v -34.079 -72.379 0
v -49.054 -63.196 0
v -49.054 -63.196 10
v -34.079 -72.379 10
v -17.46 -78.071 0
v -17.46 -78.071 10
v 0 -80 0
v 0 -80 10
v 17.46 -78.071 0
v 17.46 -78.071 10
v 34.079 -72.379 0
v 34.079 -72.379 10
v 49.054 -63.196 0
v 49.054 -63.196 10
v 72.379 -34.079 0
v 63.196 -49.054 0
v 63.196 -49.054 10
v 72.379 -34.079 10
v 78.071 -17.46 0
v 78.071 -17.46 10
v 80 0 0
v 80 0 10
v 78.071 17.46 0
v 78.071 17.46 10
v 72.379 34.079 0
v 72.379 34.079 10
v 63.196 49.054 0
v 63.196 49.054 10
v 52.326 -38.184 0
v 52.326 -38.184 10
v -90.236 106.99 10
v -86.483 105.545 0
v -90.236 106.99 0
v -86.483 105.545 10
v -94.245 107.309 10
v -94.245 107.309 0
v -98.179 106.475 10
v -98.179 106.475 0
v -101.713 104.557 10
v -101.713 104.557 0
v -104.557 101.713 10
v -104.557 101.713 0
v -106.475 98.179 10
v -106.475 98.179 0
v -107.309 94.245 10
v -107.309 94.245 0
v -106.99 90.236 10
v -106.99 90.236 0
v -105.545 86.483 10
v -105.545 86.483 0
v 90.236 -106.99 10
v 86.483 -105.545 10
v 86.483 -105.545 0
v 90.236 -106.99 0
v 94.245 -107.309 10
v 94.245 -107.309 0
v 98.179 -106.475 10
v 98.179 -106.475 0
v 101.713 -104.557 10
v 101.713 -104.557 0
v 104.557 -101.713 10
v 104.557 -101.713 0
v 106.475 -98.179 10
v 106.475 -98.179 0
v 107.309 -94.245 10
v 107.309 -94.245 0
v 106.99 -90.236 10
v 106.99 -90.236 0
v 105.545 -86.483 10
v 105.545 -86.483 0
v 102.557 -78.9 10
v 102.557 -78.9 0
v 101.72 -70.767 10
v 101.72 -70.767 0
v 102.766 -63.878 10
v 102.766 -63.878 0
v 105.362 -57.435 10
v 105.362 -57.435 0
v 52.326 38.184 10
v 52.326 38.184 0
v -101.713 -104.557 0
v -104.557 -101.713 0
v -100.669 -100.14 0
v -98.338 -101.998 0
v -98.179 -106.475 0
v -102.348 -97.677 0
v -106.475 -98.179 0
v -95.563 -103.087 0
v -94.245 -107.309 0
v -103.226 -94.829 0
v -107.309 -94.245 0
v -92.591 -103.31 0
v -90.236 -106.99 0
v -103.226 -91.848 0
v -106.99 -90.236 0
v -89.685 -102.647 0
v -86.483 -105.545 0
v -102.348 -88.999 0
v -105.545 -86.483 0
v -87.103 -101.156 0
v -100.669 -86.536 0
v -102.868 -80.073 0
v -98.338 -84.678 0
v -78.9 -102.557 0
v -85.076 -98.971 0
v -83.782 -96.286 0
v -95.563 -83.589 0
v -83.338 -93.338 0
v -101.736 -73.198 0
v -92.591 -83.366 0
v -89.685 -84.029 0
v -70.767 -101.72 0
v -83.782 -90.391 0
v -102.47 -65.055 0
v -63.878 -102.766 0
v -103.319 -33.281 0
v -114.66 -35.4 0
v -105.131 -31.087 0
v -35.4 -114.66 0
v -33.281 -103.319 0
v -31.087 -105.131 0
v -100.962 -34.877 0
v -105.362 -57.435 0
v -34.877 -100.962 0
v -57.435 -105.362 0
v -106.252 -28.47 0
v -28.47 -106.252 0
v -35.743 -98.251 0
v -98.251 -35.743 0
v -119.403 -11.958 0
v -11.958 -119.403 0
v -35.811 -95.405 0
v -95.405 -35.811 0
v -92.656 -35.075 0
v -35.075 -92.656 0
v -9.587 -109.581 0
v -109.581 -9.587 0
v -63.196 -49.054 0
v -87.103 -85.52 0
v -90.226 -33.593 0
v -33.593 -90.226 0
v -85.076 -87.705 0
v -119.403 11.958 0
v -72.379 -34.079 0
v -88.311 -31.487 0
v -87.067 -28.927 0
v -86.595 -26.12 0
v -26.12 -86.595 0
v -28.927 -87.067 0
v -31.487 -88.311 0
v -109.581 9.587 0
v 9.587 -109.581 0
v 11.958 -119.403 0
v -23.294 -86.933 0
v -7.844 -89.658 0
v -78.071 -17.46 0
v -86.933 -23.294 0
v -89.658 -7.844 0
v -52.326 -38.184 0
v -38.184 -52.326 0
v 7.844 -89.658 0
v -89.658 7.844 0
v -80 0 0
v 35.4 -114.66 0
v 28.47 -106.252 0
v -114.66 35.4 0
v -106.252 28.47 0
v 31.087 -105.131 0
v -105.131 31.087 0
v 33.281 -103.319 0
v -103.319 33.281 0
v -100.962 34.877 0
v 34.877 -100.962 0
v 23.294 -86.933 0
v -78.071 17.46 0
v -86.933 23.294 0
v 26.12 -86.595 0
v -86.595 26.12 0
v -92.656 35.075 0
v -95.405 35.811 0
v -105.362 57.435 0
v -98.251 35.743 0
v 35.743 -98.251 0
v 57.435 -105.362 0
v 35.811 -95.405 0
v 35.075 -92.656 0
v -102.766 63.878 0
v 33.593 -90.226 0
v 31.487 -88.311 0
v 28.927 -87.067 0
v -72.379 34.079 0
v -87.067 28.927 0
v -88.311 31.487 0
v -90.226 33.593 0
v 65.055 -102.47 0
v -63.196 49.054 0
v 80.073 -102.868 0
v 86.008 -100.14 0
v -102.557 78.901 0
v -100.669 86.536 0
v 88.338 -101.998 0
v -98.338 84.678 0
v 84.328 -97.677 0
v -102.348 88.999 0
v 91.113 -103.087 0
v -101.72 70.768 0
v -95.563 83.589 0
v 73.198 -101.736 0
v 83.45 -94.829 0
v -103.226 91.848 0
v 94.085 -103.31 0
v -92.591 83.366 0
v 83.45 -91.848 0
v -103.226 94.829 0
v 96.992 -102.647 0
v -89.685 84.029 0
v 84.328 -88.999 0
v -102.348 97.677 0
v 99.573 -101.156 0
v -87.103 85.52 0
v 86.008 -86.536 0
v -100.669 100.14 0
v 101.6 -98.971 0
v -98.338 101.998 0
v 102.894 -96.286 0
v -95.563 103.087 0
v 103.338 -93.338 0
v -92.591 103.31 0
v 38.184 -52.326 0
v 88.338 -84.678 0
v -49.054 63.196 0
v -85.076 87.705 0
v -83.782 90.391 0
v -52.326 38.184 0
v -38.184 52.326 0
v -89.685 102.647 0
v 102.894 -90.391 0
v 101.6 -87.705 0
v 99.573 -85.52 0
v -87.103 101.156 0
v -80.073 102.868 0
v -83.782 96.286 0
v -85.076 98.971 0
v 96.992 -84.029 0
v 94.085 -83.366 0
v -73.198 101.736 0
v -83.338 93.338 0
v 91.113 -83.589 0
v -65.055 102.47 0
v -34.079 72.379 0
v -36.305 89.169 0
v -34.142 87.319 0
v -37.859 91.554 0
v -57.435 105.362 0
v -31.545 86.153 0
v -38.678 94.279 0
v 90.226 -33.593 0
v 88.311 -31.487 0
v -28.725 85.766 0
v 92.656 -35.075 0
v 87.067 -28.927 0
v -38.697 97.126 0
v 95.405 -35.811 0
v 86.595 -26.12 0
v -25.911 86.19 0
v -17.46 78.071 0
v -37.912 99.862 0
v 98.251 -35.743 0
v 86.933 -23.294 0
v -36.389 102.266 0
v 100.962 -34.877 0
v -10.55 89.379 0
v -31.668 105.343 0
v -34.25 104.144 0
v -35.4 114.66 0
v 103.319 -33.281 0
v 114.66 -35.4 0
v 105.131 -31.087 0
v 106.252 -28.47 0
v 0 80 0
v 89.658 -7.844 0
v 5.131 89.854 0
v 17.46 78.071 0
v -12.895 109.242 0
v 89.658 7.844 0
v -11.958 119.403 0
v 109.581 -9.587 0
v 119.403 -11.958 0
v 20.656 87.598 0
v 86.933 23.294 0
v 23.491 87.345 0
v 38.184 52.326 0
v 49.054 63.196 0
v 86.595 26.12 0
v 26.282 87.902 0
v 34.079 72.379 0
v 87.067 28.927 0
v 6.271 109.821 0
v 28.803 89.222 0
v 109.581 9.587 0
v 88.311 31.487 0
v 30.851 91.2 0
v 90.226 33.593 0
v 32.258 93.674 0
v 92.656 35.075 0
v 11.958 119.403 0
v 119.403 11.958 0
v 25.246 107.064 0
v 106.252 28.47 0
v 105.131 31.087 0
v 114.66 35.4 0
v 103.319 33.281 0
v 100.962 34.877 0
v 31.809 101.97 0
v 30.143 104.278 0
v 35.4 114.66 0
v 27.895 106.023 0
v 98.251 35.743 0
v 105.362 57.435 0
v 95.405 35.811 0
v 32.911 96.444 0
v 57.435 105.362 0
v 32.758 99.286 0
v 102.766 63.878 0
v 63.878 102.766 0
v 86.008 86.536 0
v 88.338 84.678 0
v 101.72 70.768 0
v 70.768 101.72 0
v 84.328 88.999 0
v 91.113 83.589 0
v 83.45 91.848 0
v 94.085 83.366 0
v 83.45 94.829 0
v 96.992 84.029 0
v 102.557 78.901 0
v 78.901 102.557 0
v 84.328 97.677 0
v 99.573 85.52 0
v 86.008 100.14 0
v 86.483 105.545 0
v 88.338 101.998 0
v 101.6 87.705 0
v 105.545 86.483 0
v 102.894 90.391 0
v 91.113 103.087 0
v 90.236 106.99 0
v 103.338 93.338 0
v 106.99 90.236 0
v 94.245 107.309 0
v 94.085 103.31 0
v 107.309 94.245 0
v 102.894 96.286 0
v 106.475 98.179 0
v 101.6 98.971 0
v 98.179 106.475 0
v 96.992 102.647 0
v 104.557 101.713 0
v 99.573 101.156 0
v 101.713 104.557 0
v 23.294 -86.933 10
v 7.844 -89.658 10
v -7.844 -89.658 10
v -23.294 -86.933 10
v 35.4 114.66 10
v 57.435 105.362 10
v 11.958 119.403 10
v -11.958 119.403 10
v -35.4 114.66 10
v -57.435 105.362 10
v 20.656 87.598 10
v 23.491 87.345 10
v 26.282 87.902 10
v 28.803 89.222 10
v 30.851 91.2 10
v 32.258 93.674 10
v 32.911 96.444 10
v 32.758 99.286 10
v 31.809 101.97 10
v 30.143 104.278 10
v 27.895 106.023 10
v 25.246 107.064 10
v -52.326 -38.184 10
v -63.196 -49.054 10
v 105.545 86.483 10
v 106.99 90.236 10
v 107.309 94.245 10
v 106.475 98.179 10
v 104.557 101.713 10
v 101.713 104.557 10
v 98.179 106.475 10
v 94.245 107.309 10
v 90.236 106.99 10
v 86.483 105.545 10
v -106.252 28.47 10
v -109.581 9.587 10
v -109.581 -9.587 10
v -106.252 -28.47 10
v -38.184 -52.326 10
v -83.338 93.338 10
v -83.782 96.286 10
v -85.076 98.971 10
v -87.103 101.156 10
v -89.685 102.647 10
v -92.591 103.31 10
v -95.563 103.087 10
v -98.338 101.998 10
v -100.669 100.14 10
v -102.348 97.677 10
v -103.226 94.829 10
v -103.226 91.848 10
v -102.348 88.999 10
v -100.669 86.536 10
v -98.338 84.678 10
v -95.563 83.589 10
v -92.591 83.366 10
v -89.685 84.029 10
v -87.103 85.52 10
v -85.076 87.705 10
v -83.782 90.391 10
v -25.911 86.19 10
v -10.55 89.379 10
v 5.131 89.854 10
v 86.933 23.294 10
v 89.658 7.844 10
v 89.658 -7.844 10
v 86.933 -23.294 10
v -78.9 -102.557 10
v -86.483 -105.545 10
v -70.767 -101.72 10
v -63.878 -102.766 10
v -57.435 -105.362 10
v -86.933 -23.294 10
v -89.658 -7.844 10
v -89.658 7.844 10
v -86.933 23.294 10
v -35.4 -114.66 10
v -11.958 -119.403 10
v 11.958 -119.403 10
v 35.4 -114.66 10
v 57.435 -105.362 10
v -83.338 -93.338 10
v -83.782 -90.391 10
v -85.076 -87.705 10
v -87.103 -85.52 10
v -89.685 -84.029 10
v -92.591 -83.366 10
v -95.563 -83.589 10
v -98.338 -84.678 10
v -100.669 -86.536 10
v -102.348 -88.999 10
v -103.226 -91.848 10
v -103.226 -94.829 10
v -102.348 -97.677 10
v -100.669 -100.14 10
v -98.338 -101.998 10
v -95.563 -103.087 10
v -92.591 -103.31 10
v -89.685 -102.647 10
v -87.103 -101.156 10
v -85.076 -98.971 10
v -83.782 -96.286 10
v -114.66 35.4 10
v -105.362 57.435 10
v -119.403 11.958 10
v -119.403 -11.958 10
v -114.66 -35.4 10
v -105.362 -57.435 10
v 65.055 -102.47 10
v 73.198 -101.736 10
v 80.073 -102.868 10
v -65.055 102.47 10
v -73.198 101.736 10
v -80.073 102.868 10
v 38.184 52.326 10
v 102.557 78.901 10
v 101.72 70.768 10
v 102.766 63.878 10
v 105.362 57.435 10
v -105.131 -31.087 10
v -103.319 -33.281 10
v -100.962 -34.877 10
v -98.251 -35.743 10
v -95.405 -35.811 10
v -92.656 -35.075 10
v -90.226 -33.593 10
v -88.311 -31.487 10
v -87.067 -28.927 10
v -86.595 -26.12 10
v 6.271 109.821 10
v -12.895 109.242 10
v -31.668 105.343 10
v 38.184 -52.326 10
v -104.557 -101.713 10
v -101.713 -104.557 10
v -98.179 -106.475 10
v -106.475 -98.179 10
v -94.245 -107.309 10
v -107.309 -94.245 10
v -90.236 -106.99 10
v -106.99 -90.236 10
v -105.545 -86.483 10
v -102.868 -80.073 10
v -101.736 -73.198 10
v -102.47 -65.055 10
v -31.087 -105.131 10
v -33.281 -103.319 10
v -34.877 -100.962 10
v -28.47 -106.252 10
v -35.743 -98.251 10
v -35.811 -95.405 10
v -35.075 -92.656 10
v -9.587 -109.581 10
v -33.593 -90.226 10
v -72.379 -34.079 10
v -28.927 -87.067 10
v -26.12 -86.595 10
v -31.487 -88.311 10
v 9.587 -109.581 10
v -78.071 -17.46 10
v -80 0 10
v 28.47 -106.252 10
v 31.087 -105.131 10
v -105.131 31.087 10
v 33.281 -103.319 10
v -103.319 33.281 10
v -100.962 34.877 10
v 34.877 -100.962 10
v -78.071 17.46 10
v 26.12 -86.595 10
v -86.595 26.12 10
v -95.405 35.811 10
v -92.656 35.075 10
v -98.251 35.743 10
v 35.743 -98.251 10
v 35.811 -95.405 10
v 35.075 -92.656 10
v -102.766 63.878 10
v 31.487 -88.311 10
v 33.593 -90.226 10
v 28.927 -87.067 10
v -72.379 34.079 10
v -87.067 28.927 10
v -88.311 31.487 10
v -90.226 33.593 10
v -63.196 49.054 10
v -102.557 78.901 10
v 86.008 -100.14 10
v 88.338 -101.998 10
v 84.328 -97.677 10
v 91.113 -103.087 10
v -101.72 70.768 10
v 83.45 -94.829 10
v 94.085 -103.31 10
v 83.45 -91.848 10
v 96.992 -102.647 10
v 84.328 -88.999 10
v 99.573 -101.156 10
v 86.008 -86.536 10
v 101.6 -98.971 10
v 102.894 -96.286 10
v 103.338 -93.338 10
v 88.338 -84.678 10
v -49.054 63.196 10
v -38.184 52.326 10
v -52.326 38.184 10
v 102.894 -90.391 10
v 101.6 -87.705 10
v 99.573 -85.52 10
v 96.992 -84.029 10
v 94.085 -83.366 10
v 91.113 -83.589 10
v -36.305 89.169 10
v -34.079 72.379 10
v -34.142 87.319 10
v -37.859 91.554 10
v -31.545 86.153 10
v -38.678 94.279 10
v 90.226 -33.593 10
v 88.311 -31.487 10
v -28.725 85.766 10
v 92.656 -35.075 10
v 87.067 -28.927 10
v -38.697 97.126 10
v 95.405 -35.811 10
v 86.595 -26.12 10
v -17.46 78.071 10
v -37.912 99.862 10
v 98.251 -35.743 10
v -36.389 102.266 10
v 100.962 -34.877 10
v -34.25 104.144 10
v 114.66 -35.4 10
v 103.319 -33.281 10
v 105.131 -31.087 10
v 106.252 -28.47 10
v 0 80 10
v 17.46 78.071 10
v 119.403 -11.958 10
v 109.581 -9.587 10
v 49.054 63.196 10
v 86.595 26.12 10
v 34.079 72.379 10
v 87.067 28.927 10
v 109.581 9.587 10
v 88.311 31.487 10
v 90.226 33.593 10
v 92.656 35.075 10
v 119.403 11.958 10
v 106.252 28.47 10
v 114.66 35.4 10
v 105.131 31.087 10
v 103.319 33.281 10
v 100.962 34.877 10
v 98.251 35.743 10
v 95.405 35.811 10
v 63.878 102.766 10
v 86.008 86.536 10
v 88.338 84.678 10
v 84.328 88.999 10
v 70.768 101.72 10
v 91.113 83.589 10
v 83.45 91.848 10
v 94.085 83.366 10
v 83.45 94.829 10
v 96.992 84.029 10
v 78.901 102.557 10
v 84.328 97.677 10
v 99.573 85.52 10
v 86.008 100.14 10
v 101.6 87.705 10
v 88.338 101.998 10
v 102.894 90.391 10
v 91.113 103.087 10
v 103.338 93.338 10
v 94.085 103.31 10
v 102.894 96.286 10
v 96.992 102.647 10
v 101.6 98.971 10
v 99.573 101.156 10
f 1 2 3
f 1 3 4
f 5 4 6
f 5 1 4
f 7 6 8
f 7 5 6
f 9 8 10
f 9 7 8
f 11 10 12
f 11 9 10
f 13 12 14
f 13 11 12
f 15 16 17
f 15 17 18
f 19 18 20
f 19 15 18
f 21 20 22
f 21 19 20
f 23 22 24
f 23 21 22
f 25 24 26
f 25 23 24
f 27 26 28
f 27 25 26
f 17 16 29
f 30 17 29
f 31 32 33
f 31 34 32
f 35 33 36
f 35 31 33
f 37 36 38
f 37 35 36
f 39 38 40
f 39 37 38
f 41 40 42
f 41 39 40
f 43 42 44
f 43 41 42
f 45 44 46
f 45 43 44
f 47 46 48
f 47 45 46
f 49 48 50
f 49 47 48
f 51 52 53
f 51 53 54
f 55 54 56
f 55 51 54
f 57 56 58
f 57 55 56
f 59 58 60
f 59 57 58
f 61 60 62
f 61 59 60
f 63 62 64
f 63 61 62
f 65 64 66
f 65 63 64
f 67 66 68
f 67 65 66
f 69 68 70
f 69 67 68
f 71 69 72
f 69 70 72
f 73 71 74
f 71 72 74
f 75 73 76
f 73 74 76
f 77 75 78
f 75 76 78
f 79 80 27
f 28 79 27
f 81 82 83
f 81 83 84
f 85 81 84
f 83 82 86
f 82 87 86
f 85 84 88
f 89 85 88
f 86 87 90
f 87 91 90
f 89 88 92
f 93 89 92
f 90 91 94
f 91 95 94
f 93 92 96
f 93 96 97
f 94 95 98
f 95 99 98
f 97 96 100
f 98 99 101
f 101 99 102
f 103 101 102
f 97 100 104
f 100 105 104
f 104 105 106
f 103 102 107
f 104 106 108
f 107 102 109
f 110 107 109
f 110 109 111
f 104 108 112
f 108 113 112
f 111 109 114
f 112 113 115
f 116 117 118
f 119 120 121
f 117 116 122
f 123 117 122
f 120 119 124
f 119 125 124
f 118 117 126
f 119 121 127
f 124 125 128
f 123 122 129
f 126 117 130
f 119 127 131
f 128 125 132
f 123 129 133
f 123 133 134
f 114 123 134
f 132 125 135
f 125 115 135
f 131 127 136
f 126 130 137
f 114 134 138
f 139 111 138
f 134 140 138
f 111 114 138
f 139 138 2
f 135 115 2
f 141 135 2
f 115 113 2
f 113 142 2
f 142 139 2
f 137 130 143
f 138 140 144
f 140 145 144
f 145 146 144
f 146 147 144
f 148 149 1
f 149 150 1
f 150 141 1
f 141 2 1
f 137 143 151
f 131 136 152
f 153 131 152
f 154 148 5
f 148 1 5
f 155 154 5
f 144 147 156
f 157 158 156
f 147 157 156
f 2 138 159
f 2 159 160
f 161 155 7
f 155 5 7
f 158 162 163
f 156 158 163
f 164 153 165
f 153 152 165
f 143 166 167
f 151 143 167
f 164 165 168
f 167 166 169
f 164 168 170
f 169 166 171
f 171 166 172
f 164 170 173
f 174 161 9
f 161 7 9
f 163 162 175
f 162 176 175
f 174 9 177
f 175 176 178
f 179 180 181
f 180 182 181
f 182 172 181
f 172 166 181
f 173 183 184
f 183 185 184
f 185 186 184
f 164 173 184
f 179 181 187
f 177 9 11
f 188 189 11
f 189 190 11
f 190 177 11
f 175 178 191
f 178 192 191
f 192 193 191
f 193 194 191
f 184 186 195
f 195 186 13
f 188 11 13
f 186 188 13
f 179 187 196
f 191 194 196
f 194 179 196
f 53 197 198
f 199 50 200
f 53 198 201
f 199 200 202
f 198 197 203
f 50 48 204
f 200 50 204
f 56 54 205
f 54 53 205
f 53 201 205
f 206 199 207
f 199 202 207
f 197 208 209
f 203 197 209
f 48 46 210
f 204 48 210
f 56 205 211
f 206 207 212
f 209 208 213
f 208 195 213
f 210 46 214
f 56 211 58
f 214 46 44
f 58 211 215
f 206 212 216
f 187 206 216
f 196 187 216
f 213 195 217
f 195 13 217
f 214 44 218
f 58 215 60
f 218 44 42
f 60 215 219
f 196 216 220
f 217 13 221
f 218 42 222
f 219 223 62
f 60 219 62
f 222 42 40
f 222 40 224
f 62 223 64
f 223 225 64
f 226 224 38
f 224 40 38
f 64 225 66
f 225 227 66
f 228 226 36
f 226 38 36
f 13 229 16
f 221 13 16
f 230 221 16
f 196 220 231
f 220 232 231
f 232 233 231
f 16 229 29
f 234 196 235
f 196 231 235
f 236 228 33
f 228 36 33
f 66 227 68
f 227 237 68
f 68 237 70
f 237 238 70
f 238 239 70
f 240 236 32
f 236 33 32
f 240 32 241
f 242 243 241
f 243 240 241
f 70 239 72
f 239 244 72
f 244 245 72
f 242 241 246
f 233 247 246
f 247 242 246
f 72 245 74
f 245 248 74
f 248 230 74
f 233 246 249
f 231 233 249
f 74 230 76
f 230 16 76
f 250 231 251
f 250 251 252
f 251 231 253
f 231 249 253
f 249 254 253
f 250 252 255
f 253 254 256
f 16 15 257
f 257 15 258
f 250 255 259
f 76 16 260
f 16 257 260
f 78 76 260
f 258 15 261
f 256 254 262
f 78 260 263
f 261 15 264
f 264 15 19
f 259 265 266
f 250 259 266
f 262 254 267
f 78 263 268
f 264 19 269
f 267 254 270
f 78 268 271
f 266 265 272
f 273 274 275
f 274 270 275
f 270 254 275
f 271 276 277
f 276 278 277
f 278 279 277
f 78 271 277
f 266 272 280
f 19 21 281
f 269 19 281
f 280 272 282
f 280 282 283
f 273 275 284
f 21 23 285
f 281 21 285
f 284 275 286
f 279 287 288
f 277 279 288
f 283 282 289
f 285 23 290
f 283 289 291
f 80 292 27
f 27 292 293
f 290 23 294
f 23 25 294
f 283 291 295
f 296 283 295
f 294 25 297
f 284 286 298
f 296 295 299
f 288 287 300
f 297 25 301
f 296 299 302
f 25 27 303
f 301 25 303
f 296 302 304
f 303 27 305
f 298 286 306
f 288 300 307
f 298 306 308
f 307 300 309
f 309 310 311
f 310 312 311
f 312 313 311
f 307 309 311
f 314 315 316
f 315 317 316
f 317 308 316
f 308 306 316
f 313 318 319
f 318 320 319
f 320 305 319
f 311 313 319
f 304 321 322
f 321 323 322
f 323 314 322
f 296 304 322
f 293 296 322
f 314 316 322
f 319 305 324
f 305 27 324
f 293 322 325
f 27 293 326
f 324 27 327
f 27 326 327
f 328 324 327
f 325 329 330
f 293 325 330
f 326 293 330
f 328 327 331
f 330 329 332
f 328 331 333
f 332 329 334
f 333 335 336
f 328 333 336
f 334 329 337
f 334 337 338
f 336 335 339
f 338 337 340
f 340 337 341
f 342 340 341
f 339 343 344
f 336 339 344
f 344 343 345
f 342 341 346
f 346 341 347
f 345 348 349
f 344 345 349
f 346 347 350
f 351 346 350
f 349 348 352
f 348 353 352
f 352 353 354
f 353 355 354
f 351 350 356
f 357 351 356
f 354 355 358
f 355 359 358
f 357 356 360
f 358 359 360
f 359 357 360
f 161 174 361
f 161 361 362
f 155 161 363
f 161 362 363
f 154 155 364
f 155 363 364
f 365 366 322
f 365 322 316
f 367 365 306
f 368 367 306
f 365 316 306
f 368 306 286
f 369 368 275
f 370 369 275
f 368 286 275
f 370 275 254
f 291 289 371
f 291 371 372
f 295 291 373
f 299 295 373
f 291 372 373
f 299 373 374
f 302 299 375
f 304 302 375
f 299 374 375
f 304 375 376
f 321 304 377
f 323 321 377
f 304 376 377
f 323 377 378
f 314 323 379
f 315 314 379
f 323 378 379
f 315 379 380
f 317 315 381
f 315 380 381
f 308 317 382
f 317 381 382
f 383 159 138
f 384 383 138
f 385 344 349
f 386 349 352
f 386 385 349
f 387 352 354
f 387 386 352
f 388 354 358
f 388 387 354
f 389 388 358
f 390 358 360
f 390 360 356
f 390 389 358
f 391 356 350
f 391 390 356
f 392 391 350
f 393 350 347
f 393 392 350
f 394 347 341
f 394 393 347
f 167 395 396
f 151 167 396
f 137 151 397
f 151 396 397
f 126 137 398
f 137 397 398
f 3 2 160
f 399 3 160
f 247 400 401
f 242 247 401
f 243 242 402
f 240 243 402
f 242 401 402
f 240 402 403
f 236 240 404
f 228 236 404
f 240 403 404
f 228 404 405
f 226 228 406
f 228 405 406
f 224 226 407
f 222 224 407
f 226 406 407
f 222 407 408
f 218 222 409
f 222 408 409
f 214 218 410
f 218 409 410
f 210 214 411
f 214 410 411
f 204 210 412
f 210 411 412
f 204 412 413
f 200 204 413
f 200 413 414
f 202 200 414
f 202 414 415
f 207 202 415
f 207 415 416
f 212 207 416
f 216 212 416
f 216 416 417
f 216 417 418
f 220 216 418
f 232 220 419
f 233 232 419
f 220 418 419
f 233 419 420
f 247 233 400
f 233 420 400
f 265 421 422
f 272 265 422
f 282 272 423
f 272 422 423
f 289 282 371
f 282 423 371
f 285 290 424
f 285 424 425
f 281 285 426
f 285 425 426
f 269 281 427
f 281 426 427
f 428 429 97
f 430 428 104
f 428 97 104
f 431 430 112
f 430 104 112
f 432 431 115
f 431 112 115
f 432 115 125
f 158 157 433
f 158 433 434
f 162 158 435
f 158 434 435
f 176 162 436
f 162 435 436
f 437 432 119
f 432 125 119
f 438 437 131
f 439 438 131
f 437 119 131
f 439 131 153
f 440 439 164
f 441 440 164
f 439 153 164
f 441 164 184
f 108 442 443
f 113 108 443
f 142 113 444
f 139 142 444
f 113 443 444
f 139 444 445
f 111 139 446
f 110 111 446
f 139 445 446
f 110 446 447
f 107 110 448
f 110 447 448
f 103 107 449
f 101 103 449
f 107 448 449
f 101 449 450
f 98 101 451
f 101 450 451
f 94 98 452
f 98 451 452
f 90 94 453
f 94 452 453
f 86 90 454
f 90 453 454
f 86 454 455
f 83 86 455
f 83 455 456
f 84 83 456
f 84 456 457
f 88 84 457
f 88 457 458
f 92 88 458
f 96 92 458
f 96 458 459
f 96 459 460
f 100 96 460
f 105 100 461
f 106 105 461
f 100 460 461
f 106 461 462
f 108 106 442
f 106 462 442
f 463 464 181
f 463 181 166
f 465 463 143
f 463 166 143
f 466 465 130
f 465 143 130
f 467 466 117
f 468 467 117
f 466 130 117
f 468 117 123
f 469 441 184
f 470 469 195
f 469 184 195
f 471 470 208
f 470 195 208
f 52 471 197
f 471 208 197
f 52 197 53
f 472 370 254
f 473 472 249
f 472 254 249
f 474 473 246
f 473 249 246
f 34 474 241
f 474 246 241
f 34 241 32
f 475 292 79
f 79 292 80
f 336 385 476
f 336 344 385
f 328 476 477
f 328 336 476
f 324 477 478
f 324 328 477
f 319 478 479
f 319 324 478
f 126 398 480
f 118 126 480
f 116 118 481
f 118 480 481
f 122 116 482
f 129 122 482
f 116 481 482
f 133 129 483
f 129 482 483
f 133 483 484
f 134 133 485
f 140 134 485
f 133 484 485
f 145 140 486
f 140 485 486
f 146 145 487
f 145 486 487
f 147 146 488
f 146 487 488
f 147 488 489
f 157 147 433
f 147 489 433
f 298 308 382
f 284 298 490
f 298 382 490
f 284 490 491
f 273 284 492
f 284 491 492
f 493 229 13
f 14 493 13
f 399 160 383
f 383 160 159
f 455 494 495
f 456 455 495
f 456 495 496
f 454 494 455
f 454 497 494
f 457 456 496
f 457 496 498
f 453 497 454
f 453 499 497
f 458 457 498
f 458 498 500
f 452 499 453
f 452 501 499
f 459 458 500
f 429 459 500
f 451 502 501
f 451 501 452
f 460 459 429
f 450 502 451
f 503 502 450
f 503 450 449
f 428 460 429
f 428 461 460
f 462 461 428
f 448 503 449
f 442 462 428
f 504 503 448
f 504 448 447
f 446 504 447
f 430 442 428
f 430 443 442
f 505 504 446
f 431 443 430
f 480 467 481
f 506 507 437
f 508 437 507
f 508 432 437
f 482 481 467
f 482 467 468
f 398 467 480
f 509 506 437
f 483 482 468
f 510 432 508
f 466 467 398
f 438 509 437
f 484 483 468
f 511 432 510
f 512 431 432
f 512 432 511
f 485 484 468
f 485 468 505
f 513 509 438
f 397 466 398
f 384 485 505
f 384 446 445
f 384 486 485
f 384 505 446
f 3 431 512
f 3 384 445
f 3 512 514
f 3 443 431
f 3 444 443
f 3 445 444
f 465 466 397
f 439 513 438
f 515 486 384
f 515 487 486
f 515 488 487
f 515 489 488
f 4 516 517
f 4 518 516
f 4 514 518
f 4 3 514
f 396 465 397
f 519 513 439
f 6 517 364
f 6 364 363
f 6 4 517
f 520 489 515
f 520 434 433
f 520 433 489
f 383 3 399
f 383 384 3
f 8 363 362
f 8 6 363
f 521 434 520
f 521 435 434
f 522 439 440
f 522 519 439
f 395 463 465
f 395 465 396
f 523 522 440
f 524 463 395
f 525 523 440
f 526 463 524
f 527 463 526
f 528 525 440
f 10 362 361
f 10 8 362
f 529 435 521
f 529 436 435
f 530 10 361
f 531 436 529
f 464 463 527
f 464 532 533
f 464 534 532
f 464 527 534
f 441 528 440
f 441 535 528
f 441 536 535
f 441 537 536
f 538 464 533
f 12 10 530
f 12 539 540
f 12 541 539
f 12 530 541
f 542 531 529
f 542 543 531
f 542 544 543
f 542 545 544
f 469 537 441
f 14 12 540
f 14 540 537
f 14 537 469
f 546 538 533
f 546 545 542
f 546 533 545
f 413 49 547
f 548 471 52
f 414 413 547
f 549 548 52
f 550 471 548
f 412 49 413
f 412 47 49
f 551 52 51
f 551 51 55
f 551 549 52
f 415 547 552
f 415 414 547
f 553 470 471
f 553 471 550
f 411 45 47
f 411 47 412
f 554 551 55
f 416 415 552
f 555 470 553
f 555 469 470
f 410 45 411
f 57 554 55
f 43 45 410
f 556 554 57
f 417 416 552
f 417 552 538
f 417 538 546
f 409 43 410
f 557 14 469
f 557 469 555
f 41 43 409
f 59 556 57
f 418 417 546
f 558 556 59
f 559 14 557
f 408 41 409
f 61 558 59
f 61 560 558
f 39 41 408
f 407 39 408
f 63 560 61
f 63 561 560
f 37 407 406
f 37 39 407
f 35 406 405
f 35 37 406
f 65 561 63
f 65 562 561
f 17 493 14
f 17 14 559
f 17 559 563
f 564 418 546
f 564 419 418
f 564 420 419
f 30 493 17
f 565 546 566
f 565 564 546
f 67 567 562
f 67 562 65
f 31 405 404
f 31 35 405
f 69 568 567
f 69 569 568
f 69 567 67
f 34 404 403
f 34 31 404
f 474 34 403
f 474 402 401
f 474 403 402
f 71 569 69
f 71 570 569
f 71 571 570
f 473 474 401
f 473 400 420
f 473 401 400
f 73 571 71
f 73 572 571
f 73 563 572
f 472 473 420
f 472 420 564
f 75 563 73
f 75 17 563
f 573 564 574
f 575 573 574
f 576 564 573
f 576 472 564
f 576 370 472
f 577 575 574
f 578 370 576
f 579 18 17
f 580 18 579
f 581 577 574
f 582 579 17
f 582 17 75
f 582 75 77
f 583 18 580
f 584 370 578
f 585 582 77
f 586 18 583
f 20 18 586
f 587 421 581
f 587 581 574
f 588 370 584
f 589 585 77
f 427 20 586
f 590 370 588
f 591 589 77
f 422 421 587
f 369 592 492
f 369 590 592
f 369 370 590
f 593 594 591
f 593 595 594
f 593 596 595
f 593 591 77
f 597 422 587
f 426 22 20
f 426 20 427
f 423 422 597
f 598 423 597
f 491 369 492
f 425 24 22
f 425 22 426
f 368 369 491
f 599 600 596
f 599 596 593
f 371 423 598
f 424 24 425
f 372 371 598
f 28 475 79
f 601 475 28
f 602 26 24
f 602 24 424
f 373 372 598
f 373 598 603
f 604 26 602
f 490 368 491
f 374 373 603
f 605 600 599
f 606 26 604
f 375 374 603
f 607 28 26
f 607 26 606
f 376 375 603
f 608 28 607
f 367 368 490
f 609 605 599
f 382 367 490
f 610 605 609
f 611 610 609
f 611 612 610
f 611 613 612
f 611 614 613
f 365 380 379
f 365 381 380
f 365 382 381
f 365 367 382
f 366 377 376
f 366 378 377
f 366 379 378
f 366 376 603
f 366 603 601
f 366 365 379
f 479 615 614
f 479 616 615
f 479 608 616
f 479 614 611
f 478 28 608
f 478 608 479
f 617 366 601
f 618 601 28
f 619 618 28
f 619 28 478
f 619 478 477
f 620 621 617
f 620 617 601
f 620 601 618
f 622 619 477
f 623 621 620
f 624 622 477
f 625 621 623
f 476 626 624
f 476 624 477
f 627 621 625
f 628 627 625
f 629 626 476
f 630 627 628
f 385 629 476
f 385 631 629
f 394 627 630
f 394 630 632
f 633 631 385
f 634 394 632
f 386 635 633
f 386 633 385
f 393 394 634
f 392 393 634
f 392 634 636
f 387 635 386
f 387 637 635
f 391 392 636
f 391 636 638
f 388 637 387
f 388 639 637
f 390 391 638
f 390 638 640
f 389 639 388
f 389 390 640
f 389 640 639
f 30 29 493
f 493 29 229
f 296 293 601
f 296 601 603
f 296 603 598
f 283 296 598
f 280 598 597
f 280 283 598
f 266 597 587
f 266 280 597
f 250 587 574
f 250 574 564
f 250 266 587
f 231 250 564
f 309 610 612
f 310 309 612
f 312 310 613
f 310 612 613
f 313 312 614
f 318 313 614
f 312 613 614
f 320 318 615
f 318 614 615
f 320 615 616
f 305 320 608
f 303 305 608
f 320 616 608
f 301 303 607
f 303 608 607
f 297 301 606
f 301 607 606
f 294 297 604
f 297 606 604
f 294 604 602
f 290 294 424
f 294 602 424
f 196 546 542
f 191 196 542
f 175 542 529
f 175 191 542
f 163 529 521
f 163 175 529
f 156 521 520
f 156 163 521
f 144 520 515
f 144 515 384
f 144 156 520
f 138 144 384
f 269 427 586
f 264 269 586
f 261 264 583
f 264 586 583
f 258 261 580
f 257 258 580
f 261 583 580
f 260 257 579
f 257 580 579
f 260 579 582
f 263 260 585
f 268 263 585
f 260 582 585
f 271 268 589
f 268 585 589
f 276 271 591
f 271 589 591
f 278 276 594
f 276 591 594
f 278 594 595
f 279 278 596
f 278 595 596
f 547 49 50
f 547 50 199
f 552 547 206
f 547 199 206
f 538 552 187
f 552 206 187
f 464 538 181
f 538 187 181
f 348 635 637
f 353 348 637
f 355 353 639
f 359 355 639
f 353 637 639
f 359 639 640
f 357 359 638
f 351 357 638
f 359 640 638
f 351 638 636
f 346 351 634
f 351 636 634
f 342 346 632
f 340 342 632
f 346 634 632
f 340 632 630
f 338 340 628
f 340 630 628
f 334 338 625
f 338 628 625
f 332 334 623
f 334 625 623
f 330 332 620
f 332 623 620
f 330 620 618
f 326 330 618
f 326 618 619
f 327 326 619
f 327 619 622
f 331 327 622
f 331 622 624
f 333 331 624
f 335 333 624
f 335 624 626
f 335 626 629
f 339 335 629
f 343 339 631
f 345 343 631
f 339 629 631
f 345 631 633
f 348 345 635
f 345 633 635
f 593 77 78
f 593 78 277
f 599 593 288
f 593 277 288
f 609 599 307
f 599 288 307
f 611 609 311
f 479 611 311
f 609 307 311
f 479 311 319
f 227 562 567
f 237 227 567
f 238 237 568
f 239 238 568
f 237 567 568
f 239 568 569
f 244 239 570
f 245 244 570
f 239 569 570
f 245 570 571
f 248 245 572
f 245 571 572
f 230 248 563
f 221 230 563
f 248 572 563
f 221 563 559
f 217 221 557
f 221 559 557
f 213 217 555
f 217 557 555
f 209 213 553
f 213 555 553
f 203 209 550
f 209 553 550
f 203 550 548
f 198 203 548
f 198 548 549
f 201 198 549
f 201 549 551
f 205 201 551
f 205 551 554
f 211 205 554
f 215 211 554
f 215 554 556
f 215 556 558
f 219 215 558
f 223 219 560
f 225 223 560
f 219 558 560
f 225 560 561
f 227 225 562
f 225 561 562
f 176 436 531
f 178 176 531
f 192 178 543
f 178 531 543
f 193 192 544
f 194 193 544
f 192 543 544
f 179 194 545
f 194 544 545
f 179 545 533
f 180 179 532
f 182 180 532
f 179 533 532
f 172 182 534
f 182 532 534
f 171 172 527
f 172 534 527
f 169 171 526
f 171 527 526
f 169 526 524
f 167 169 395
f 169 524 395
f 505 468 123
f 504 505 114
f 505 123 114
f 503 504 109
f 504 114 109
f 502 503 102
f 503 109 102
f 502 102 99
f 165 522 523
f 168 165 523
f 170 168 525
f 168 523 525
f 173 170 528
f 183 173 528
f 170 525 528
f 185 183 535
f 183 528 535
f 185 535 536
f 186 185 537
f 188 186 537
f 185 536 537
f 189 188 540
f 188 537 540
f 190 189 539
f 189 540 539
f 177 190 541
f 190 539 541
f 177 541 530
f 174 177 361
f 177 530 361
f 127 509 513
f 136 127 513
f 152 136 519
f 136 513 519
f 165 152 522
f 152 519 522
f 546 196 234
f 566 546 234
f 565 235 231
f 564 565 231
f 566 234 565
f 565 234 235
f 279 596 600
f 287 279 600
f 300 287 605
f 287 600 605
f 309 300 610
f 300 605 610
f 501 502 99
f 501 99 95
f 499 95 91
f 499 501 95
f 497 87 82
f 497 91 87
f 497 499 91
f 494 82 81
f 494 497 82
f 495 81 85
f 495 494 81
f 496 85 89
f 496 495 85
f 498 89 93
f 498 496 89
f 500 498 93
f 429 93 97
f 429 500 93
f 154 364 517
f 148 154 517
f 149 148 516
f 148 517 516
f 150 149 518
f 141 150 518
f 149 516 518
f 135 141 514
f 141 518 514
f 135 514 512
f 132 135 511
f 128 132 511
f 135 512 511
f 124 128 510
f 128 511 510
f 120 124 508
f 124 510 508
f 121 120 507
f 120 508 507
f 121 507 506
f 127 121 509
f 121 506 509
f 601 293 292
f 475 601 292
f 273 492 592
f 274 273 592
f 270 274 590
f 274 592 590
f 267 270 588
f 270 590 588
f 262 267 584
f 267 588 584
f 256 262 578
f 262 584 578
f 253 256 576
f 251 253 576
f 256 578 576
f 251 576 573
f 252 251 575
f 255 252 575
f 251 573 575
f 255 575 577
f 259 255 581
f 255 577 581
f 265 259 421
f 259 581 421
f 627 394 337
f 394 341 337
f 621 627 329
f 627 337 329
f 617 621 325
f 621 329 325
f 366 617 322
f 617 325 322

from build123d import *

# Parameters (mm, degrees)
ESBO_O1_R                = 120
ESBO_O1_R_2              = 80
RESSALTO_EXTRUS_O1_DEPTH = 10
CORTE_EXTRUS_O1_DEPTH    = 10
ESBO_O3_R                = 14
ESBO_O3_R_2              = 10
RESSALTO_EXTRUS_O2_DEPTH = 10
FILETE1_R                = 30
RESSALTO_EXTRUS_O3_START = -10
RESSALTO_EXTRUS_O3_DEPTH = 10


with BuildPart() as part:
    # Esboço1 → Ressalto-extrusão1 (new body)
    with BuildSketch(Plane.XY):
        Circle(ESBO_O1_R)
        Circle(ESBO_O1_R_2, mode=Mode.SUBTRACT)
    extrude(amount=RESSALTO_EXTRUS_O1_DEPTH)

    # Esboço2 → Corte-extrusão1 (cut)
    with BuildSketch(Plane.XY.offset(10)):
        with BuildLine():
            ThreePointArc((25.245684703, 107.063791283), (-3.324689368, 109.949745068), (-31.668491353, 105.342805428))
            ThreePointArc((-31.668491353, 105.342805428), (-38.366156269, 92.887232993), (-25.910583834, 86.189568077))
            ThreePointArc((-25.910583834, 86.189568077), (-2.720200392, 89.958882329), (20.655560211, 87.597647413))
            ThreePointArc((20.655560211, 87.597647413), (32.683694392, 95.035657102), (25.245684703, 107.063791283))
        make_face()
        with BuildLine():
            ThreePointArc((106.251840892, -28.470094961), (110, 0), (106.251840892, 28.470094961))
            ThreePointArc((106.251840892, 28.470094961), (94.004392178, 35.541162773), (86.933324366, 23.293714059))
            ThreePointArc((86.933324366, 23.293714059), (90, 0), (86.933324366, -23.293714059))
            ThreePointArc((86.933324366, -23.293714059), (94.004392178, -35.541162773), (106.251840892, -28.470094961))
        make_face()
        with BuildLine():
            ThreePointArc((-28.470094961, -106.251840892), (0, -110), (28.470094961, -106.251840892))
            ThreePointArc((28.470094961, -106.251840892), (35.541162773, -94.004392178), (23.293714059, -86.933324366))
            ThreePointArc((23.293714059, -86.933324366), (0, -90), (-23.293714059, -86.933324366))
            ThreePointArc((-23.293714059, -86.933324366), (-35.541162773, -94.004392178), (-28.470094961, -106.251840892))
        make_face()
        with BuildLine():
            ThreePointArc((-106.251840892, 28.470094961), (-110, 0), (-106.251840892, -28.470094961))
            ThreePointArc((-106.251840892, -28.470094961), (-94.004392178, -35.541162773), (-86.933324366, -23.293714059))
            ThreePointArc((-86.933324366, -23.293714059), (-90, 0), (-86.933324366, 23.293714059))
            ThreePointArc((-86.933324366, 23.293714059), (-94.004392178, 35.541162773), (-106.251840892, 28.470094961))
        make_face()
    extrude(amount=-CORTE_EXTRUS_O1_DEPTH, mode=Mode.SUBTRACT)

    # Esboço3 → Ressalto-extrusão2 (add)
    # profile 1 of 4: a face of its own
    with BuildSketch(Plane.XY.offset(10)):
        with Locations((93.338095117, 93.338095117)):
            Circle(ESBO_O3_R)
        with Locations((93.338095117, 93.338095117)):
            Circle(ESBO_O3_R_2, mode=Mode.SUBTRACT)
    # profile 2 of 4: a face of its own
    with BuildSketch(Plane.XY.offset(10)):
        with Locations((93.338095117, -93.338095117)):
            Circle(ESBO_O3_R)
        with Locations((93.338095117, -93.338095117)):
            Circle(ESBO_O3_R_2, mode=Mode.SUBTRACT)
    # profile 3 of 4: a face of its own
    with BuildSketch(Plane.XY.offset(10)):
        with Locations((-93.338095117, -93.338095117)):
            Circle(ESBO_O3_R)
        with Locations((-93.338095117, -93.338095117)):
            Circle(ESBO_O3_R_2, mode=Mode.SUBTRACT)
    # profile 4 of 4: a face of its own
    with BuildSketch(Plane.XY.offset(10)):
        with Locations((-93.338095117, 93.338095117)):
            Circle(ESBO_O3_R)
        with Locations((-93.338095117, 93.338095117)):
            Circle(ESBO_O3_R_2, mode=Mode.SUBTRACT)
    extrude(amount=-RESSALTO_EXTRUS_O2_DEPTH)

    # Filete1
    filete1_edges = [part.edges().sort_by_distance(p)[0] for p in [
        (-89.573264047, -79.853806221, 5),
        (-79.853806221, -89.573264047, 5),
        (-79.853806221, 89.573264047, 5),
        (-89.573264047, 79.853806221, 5),
        (79.853806221, 89.573264047, 5),
        (89.573264047, 79.853806221, 5),
        (89.573264047, -79.853806221, 5),
        (79.853806221, -89.573264047, 5),
    ]]
    fillet(filete1_edges, radius=FILETE1_R)

    # Esboço4 → Ressalto-extrusão3 (add)
    with BuildSketch(Plane.XY.offset(10).offset(RESSALTO_EXTRUS_O3_START)):
        with BuildLine():
            Line((52.325901808, -38.183766184), (38.183766184, -52.325901808))
            Line((38.183766184, -52.325901808), (49.05379299, -63.195928613))
            ThreePointArc((49.05379299, -63.195928613), (56.568542495, -56.568542495), (63.195928613, -49.05379299))
            Line((63.195928613, -49.05379299), (52.325901808, -38.183766184))
        make_face()
        with BuildLine():
            Line((-38.183766184, -52.325901808), (-52.325901808, -38.183766184))
            Line((-52.325901808, -38.183766184), (-63.195928613, -49.05379299))
            ThreePointArc((-63.195928613, -49.05379299), (-56.568542495, -56.568542495), (-49.05379299, -63.195928613))
            Line((-49.05379299, -63.195928613), (-38.183766184, -52.325901808))
        make_face()
        with BuildLine():
            Line((38.183766184, 52.325901808), (52.325901808, 38.183766184))
            Line((52.325901808, 38.183766184), (63.195928613, 49.05379299))
            ThreePointArc((63.195928613, 49.05379299), (56.568542495, 56.568542495), (49.05379299, 63.195928613))
            Line((49.05379299, 63.195928613), (38.183766184, 52.325901808))
        make_face()
        with BuildLine():
            Line((-52.325901808, 38.183766184), (-38.183766184, 52.325901808))
            Line((-38.183766184, 52.325901808), (-49.05379299, 63.195928613))
            ThreePointArc((-49.05379299, 63.195928613), (-56.568542495, 56.568542495), (-63.195928613, 49.05379299))
            Line((-63.195928613, 49.05379299), (-52.325901808, 38.183766184))
        make_face()
    extrude(amount=RESSALTO_EXTRUS_O3_DEPTH)


solid = part.part
